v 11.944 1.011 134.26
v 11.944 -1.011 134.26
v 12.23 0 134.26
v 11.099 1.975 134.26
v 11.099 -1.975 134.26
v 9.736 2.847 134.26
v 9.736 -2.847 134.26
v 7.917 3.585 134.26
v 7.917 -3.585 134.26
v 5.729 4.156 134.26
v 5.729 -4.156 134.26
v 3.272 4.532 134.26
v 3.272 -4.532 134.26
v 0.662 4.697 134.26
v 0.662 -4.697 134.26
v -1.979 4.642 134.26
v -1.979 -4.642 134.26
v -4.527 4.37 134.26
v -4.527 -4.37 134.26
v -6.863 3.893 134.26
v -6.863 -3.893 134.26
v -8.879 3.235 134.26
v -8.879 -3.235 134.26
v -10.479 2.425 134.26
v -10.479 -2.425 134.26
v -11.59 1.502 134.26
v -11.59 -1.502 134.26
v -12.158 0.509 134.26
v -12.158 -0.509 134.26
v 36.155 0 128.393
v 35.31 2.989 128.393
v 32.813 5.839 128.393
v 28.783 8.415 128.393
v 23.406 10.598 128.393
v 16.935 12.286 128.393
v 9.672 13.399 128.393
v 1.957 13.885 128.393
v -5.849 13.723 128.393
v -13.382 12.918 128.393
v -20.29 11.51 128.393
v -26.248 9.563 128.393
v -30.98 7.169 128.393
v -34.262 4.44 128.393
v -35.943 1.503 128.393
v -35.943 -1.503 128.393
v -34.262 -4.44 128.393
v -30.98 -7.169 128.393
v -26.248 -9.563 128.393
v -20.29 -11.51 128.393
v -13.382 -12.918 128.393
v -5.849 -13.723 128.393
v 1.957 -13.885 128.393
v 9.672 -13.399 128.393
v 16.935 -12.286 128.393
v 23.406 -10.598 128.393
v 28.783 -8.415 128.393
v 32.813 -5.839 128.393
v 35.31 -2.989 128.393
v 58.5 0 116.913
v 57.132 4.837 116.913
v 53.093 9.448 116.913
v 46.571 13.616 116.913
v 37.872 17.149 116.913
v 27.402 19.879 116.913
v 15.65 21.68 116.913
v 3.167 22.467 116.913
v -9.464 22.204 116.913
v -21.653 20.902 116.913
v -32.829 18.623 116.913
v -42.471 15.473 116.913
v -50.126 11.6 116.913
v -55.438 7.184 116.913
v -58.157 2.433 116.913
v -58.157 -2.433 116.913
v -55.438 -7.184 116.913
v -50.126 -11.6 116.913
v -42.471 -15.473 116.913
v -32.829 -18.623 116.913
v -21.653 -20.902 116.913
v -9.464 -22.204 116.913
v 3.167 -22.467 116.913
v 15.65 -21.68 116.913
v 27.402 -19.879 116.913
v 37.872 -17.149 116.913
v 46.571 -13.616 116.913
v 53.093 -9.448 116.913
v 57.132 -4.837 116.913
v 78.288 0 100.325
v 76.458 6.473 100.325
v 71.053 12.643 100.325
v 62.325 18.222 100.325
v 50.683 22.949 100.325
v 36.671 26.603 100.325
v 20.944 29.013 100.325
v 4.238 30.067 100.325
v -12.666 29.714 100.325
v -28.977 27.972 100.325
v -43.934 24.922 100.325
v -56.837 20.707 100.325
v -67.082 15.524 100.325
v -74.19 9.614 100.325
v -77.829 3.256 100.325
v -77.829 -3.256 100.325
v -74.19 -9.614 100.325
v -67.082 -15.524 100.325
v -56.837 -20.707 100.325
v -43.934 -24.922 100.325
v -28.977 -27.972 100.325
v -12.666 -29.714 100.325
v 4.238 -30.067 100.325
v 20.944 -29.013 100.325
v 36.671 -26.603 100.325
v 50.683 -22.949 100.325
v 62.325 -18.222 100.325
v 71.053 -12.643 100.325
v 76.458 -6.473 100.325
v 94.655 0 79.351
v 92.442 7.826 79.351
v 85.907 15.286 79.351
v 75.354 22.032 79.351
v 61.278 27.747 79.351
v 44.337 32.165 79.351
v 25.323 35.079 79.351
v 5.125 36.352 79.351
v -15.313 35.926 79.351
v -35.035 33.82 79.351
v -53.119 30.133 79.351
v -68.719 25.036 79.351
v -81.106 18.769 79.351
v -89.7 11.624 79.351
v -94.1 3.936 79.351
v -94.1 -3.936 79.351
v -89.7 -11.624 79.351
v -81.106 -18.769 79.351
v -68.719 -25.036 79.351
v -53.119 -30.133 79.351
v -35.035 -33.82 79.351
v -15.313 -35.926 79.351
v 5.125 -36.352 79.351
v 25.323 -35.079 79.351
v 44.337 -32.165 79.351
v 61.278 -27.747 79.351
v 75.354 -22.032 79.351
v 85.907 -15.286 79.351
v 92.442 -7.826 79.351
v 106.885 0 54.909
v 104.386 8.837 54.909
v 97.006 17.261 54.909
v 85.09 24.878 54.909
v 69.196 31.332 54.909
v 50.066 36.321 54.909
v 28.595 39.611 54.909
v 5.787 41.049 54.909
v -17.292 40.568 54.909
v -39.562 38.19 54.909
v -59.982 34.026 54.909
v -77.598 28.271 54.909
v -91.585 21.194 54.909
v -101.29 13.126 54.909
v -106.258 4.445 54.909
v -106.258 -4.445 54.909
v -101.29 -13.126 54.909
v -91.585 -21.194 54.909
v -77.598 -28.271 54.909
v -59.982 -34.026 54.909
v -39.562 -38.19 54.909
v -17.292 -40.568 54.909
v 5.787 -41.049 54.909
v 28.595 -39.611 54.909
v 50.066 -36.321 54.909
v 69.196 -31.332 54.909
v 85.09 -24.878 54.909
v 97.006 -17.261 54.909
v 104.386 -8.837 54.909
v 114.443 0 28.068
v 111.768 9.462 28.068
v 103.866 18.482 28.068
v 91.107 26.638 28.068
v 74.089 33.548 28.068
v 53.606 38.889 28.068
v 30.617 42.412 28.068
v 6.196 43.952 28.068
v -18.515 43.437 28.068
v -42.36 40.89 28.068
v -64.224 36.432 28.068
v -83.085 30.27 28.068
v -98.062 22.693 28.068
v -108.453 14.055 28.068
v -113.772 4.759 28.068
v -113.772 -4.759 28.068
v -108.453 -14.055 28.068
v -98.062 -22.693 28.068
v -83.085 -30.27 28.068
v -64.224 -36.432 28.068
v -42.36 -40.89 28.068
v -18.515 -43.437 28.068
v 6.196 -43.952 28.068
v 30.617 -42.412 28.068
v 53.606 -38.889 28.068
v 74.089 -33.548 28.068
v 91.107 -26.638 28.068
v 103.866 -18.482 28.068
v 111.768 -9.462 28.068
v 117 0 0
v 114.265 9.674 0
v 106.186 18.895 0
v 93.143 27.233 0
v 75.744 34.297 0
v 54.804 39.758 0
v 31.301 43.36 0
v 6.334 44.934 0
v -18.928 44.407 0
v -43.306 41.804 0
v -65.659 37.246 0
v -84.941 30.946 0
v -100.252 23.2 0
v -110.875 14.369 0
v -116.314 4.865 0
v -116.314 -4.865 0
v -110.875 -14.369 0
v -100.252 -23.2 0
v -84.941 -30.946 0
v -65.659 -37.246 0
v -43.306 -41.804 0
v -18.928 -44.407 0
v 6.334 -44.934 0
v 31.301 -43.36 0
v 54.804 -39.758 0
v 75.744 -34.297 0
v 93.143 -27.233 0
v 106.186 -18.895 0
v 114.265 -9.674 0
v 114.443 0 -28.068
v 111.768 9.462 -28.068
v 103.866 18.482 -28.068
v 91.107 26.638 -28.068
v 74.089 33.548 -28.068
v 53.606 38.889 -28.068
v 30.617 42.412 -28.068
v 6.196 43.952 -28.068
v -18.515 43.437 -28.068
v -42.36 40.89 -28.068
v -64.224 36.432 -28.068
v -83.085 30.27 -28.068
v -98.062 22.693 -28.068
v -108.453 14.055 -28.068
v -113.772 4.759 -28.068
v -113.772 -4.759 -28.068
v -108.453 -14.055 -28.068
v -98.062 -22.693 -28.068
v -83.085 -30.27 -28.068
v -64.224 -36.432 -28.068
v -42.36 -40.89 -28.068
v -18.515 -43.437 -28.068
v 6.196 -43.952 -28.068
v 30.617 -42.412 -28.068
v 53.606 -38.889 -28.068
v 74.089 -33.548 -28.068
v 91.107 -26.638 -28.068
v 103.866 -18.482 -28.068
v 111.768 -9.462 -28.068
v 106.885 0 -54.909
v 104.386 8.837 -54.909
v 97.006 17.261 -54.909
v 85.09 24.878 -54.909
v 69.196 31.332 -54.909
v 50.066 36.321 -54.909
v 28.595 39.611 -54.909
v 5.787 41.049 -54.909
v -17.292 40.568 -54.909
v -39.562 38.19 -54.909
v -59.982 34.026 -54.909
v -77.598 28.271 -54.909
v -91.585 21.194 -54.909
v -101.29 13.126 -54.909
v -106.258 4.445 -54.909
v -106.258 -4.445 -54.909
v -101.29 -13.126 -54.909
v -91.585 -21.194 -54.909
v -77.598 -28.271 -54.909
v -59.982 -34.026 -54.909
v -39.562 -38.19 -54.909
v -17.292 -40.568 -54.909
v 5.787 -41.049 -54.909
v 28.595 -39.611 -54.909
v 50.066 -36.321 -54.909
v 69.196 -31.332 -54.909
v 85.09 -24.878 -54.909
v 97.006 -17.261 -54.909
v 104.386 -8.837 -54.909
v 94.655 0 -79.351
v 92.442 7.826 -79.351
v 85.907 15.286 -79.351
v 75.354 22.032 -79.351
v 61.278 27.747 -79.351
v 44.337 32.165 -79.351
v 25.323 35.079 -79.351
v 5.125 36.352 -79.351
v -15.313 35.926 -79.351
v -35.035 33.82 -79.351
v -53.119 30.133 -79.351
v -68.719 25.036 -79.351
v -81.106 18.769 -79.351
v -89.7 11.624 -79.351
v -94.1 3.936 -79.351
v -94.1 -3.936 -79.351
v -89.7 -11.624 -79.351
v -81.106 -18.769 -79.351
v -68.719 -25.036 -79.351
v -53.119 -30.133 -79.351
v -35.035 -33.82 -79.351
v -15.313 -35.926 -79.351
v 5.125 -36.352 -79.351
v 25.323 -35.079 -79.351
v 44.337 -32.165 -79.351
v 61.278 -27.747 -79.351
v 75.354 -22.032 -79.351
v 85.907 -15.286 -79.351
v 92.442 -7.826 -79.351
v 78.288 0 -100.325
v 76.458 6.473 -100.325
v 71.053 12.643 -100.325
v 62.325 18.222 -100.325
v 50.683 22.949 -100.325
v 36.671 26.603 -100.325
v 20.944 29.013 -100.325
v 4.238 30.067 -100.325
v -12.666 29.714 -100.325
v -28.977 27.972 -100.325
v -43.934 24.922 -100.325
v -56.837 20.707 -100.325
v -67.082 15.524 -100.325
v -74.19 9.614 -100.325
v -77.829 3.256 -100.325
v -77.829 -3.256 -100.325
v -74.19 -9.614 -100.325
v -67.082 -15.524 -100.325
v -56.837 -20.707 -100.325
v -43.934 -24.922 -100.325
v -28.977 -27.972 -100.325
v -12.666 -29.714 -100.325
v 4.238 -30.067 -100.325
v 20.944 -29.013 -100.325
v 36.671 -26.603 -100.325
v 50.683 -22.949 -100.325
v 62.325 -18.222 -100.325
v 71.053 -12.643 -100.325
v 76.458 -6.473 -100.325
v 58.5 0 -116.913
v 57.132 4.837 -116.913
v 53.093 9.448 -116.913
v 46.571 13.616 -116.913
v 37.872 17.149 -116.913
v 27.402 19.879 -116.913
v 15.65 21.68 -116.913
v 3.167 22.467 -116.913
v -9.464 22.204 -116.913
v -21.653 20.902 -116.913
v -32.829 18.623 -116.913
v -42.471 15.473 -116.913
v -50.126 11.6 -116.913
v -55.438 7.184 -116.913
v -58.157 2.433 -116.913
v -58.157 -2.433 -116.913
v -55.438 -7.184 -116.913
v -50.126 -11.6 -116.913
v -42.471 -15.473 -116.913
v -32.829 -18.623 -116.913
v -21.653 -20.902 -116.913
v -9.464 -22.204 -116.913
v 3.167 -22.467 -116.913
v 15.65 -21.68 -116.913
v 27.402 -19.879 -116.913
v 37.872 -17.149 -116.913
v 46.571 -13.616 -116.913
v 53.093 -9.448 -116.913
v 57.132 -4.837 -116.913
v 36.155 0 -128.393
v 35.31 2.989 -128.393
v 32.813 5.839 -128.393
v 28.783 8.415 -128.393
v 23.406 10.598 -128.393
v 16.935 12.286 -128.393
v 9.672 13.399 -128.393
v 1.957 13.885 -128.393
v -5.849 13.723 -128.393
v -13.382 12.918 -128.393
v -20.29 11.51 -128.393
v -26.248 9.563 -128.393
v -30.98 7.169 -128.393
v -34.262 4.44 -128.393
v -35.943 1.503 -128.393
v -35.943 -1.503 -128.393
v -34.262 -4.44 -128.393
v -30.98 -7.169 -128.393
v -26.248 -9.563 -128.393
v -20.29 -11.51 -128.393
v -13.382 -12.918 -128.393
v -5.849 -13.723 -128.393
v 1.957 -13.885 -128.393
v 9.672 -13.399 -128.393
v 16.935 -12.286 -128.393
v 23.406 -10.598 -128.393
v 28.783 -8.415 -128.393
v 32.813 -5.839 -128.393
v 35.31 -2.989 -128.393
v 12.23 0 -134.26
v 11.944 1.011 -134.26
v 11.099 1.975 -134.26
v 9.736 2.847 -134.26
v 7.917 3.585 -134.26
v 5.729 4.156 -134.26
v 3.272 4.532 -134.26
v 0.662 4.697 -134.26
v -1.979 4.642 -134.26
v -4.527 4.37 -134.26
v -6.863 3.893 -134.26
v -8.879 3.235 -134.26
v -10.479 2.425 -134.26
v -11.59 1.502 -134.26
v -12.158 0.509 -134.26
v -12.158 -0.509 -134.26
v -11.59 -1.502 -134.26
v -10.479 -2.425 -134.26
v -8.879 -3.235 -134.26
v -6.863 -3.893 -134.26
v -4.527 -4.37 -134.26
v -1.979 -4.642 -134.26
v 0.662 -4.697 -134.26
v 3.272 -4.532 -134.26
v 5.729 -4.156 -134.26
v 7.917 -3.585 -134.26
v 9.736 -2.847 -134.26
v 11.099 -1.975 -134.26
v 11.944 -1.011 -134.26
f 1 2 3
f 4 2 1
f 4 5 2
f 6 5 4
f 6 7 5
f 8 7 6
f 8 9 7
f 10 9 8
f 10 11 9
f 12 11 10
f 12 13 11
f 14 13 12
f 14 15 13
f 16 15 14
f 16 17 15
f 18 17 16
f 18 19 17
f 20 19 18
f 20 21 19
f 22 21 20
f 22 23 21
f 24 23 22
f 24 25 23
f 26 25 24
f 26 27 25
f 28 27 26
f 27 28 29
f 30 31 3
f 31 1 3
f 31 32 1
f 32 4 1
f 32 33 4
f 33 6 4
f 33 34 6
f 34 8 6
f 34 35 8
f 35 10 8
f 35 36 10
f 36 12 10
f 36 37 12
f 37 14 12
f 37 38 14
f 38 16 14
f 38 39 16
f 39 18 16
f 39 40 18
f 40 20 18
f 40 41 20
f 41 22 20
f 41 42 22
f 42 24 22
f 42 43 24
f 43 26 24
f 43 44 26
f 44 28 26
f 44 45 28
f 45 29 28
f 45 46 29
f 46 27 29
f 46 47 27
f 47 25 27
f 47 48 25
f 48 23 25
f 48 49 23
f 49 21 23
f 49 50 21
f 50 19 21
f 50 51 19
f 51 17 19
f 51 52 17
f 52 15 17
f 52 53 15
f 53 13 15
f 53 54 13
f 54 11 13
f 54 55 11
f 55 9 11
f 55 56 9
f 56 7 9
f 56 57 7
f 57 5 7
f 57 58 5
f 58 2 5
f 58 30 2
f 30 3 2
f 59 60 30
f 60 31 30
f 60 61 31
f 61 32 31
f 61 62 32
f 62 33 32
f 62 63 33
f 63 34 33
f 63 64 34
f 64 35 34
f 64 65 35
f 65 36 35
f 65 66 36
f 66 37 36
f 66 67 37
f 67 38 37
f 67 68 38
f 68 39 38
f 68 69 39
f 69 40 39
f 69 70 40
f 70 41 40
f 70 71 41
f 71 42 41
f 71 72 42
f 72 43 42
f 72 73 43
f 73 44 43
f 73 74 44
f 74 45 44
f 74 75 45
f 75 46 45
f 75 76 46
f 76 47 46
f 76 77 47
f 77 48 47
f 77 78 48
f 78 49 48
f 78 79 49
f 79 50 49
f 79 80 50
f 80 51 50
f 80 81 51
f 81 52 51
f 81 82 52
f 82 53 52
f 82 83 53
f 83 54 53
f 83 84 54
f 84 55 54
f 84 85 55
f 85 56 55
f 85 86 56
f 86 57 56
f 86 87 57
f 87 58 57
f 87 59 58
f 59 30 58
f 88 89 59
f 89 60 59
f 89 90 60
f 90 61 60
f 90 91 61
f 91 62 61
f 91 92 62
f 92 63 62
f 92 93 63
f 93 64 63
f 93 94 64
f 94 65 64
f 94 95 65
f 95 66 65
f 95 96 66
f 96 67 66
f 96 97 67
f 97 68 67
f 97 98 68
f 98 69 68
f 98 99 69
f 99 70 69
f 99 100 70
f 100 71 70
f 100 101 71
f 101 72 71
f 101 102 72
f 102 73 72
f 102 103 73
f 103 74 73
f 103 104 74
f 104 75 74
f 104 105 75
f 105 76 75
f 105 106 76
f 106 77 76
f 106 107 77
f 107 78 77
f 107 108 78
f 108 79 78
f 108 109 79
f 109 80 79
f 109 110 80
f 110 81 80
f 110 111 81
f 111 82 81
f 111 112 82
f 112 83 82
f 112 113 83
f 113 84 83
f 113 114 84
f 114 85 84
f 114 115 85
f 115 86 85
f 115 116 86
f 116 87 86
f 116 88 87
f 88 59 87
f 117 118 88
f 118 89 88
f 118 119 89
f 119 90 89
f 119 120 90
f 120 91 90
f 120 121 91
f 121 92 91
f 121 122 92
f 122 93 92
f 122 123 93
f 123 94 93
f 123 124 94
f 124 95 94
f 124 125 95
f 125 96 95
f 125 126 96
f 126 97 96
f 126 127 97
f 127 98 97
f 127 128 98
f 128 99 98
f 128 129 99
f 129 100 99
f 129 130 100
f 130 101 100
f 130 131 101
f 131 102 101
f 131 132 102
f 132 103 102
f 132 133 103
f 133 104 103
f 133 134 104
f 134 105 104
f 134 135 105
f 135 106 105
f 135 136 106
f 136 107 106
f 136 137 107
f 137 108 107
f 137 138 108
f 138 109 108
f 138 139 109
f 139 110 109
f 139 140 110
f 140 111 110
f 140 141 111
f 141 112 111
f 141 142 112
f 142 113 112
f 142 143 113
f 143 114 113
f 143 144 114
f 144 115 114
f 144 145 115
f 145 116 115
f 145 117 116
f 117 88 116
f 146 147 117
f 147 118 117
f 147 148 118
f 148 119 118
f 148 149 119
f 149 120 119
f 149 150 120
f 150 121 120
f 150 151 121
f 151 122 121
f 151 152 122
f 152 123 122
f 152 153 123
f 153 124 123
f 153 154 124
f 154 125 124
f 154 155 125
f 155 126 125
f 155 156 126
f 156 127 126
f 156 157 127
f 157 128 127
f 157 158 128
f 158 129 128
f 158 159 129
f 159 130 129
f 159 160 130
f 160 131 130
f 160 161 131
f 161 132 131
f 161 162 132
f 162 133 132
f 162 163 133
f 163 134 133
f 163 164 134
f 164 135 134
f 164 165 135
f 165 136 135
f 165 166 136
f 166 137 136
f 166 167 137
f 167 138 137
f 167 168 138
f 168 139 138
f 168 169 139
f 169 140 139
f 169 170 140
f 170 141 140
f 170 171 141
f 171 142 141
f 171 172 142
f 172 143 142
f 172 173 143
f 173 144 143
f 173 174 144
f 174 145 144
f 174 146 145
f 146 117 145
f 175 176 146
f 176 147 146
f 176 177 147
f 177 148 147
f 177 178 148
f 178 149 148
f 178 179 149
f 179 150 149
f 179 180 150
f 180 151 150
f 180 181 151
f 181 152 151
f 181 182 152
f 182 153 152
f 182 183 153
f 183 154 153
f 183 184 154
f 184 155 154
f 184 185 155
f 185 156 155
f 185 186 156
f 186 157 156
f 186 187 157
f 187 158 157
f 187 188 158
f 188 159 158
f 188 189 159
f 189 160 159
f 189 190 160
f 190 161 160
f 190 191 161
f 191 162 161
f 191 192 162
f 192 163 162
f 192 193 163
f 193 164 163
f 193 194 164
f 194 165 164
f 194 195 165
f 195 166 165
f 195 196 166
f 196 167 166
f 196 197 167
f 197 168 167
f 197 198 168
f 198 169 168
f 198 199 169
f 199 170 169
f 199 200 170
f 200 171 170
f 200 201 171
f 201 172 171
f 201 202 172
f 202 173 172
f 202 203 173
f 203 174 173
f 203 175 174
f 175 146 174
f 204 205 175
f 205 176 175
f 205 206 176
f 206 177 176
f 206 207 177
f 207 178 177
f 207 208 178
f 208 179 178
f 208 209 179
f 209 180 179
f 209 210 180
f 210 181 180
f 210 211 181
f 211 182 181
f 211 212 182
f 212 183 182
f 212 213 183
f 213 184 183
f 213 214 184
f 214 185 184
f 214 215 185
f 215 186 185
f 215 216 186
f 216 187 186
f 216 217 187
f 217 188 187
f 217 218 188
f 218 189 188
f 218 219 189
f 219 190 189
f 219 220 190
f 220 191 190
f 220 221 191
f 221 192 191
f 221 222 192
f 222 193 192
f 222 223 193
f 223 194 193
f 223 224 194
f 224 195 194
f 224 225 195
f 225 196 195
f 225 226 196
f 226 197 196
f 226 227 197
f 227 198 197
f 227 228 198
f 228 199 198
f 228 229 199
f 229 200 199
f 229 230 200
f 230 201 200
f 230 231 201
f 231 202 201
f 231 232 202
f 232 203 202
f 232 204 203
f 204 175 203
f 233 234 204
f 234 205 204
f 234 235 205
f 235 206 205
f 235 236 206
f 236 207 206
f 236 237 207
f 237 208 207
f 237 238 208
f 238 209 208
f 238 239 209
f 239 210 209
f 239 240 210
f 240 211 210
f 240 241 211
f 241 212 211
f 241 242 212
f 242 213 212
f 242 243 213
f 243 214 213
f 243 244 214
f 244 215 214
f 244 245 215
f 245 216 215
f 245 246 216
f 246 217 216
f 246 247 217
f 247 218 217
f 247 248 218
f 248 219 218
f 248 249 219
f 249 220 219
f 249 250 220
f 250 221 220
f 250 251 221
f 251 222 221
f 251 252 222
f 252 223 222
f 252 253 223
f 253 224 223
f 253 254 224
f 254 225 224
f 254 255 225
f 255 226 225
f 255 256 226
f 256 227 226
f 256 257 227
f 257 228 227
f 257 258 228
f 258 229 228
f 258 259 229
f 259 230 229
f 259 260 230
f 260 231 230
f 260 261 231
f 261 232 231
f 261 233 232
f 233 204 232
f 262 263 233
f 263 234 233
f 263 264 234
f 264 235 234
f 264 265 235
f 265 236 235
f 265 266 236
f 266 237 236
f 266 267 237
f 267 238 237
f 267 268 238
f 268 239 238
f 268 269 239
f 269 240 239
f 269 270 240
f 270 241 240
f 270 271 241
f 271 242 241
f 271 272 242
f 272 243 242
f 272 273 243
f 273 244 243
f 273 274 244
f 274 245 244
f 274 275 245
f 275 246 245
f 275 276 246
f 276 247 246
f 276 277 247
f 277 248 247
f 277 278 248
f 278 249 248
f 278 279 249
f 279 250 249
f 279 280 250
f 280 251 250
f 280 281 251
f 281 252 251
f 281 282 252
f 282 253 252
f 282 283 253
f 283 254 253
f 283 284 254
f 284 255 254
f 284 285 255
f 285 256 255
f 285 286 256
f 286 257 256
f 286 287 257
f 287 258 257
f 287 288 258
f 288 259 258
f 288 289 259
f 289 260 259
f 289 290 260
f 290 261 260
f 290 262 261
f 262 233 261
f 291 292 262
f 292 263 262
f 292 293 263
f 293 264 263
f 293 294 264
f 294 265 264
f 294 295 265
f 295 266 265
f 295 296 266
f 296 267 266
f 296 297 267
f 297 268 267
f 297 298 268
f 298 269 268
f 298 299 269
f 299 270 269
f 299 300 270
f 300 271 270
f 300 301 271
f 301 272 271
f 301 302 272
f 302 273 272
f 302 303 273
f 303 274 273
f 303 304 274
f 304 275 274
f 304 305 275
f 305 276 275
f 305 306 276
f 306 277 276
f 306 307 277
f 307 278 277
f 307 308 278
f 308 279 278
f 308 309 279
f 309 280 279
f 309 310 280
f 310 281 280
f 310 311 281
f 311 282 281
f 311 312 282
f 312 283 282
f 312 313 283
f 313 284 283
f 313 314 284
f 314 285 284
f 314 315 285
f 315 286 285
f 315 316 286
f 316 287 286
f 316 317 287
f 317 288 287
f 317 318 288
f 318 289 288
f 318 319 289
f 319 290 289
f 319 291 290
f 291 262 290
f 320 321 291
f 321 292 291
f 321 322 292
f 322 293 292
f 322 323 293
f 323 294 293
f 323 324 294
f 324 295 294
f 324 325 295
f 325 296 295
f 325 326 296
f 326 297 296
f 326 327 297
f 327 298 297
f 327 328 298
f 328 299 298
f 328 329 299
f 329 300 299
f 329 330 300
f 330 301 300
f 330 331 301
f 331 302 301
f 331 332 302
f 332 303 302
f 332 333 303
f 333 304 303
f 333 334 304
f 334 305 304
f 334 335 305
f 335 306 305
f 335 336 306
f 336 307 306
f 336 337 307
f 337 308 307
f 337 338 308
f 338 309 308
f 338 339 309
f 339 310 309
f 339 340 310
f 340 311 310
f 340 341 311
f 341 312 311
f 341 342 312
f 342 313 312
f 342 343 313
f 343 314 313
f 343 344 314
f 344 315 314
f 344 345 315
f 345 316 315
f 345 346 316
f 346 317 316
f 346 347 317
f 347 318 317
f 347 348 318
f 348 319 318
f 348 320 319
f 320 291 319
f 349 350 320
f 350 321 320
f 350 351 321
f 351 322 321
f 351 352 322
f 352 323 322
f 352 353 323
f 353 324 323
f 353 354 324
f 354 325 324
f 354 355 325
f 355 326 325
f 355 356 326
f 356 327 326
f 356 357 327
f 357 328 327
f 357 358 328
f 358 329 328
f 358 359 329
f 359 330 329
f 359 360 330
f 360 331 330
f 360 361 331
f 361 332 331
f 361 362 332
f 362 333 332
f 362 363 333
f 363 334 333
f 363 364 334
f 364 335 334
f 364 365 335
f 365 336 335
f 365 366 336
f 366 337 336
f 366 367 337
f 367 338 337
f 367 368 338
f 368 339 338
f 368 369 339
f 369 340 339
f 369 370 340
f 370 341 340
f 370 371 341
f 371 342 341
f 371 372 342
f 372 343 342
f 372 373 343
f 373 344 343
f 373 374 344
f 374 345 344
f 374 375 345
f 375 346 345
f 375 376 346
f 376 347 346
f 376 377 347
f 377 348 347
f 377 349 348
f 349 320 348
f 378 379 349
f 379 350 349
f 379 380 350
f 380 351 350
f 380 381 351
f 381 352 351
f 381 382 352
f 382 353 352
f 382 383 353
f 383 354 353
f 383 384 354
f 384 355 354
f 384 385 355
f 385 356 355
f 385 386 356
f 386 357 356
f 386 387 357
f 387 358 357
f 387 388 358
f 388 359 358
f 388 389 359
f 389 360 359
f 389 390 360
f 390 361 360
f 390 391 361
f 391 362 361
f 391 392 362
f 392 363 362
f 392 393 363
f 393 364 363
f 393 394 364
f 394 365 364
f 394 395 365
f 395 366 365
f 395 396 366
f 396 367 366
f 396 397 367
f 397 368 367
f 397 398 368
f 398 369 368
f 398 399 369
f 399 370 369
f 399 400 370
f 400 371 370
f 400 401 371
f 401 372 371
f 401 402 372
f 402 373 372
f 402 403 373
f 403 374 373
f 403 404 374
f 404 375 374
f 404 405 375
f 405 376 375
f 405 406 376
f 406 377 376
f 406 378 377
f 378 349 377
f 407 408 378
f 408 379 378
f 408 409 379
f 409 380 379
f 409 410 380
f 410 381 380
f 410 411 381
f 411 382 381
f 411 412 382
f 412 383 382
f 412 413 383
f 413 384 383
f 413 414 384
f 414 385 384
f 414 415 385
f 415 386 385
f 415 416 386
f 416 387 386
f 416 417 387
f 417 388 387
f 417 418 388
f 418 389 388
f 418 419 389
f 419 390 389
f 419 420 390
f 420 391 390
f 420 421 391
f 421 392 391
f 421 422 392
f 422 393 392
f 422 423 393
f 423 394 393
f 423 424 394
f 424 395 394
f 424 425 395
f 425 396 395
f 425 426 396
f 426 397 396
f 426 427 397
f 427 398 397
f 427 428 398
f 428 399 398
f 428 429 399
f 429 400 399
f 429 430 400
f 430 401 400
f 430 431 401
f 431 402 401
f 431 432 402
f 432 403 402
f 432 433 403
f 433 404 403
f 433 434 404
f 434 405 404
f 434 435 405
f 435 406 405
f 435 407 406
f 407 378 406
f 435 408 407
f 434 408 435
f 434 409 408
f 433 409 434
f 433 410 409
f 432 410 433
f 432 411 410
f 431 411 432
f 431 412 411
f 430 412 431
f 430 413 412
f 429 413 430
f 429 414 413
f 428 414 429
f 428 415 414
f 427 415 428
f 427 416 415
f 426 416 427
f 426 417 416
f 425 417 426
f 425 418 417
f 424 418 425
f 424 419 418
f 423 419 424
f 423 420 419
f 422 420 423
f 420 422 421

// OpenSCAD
// Generated by SolidPython 1.0.1 on 2020-07-29 00:46:50


scale(v = [13, 5, 15]) {
	sphere(r = 9);
}
/***********************************************
*********      SolidPython code:      **********
************************************************
 
# import packages: SolidPython
from solid import *
from solid.utils import *
from itertools import chain, combinations, permutations


class Resize:

    def __init__(self, scad_file):
        self.scad_file = scad_file
        #self.scad_file = import_scad(scad_file)
        # cone/cylinder param:
        self.r1 = 0
        self.r2 = 0
        self.h = 0
        # rectangular prism param:
        self.w = 0
        self.l = 0
        # ellipse param:
        self.r = 0

    # import OpenScad code (file name corresponds to shape)


    # classify shape + parameters
    def assign(self, param1, param2, param3):
        if self.scad_file == 'cone.scad':
            self.r1 = param1
            self.r2 = param2
            self.h = param3
        elif self.scad_file == 'cylinder.scad':
            self.r1 = param1
            self.r2 = param2
            self.h = param3
        elif self.scad_file == 'rectangularPrism.scad':
            self.h = param1
            self.l = param2
            self.w = param3
        else:
            self.r = param1
            self.h = param2

    # resize parameters
    def iterate(self):
        x = range(3, 20, 2)
        i = 1
        if self.scad_file == 'cone.scad':
            tempList = list(permutations(x, 2))
            for temp in tempList:
                param1 = temp[0]
                param2 = temp[1]
                filepath = 'produced_scad_files/' + 'cone' + str(param1) + '_' + str(param2) + '_' + '.scad'
                scad_render_to_file(cylinder(h=param1, r1=param2, r2=0), filepath)

        elif self.scad_file == 'cylinder.scad':
            tempList = list(permutations(x, 3))
            for temp in tempList:
                param1 = temp[0]
                param2 = temp[1]
                filepath = 'produced_scad_files/' + 'cylinder' + str(param1) + '_' + str(param2) + '_' + '.scad'
                scad_render_to_file(cylinder(h=param1, r1=param2, r2=param2), filepath)

        elif self.scad_file == 'rectangularPrism.scad':
            tempList = list(permutations(x, 3))
            for temp in tempList:
                param1 = temp[0]
                param2 = temp[1]
                param3 = temp[2]
                filepath = 'produced_scad_files/' + 'rectangularPrism' + str(param1) + '_' + str(param2) + '_' + str(
                    param3) + '.scad'
                scad_render_to_file(cube(size=(param1, param2, param3)), filepath)

        elif self.scad_file == 'ellipse.scad':
            tempList = list(permutations(x, 4))
            for temp in tempList:
                param1 = temp[0]
                param2 = temp[1]
                param3 = temp[2]
                param4 = temp[3]
                filepath = 'produced_scad_files/' + 'ellipse' + str(param1) + '_' + str(param2) + '_' + str(param3) + '_' + str(param4) + '.scad'
                scad_render_to_file(scale([param1, param2, param3])(sphere(r=param4)), filepath)

    def render_to_scadfile(self):
        scad_render_to_file(scad, 'example.scad') 
 
************************************************/
